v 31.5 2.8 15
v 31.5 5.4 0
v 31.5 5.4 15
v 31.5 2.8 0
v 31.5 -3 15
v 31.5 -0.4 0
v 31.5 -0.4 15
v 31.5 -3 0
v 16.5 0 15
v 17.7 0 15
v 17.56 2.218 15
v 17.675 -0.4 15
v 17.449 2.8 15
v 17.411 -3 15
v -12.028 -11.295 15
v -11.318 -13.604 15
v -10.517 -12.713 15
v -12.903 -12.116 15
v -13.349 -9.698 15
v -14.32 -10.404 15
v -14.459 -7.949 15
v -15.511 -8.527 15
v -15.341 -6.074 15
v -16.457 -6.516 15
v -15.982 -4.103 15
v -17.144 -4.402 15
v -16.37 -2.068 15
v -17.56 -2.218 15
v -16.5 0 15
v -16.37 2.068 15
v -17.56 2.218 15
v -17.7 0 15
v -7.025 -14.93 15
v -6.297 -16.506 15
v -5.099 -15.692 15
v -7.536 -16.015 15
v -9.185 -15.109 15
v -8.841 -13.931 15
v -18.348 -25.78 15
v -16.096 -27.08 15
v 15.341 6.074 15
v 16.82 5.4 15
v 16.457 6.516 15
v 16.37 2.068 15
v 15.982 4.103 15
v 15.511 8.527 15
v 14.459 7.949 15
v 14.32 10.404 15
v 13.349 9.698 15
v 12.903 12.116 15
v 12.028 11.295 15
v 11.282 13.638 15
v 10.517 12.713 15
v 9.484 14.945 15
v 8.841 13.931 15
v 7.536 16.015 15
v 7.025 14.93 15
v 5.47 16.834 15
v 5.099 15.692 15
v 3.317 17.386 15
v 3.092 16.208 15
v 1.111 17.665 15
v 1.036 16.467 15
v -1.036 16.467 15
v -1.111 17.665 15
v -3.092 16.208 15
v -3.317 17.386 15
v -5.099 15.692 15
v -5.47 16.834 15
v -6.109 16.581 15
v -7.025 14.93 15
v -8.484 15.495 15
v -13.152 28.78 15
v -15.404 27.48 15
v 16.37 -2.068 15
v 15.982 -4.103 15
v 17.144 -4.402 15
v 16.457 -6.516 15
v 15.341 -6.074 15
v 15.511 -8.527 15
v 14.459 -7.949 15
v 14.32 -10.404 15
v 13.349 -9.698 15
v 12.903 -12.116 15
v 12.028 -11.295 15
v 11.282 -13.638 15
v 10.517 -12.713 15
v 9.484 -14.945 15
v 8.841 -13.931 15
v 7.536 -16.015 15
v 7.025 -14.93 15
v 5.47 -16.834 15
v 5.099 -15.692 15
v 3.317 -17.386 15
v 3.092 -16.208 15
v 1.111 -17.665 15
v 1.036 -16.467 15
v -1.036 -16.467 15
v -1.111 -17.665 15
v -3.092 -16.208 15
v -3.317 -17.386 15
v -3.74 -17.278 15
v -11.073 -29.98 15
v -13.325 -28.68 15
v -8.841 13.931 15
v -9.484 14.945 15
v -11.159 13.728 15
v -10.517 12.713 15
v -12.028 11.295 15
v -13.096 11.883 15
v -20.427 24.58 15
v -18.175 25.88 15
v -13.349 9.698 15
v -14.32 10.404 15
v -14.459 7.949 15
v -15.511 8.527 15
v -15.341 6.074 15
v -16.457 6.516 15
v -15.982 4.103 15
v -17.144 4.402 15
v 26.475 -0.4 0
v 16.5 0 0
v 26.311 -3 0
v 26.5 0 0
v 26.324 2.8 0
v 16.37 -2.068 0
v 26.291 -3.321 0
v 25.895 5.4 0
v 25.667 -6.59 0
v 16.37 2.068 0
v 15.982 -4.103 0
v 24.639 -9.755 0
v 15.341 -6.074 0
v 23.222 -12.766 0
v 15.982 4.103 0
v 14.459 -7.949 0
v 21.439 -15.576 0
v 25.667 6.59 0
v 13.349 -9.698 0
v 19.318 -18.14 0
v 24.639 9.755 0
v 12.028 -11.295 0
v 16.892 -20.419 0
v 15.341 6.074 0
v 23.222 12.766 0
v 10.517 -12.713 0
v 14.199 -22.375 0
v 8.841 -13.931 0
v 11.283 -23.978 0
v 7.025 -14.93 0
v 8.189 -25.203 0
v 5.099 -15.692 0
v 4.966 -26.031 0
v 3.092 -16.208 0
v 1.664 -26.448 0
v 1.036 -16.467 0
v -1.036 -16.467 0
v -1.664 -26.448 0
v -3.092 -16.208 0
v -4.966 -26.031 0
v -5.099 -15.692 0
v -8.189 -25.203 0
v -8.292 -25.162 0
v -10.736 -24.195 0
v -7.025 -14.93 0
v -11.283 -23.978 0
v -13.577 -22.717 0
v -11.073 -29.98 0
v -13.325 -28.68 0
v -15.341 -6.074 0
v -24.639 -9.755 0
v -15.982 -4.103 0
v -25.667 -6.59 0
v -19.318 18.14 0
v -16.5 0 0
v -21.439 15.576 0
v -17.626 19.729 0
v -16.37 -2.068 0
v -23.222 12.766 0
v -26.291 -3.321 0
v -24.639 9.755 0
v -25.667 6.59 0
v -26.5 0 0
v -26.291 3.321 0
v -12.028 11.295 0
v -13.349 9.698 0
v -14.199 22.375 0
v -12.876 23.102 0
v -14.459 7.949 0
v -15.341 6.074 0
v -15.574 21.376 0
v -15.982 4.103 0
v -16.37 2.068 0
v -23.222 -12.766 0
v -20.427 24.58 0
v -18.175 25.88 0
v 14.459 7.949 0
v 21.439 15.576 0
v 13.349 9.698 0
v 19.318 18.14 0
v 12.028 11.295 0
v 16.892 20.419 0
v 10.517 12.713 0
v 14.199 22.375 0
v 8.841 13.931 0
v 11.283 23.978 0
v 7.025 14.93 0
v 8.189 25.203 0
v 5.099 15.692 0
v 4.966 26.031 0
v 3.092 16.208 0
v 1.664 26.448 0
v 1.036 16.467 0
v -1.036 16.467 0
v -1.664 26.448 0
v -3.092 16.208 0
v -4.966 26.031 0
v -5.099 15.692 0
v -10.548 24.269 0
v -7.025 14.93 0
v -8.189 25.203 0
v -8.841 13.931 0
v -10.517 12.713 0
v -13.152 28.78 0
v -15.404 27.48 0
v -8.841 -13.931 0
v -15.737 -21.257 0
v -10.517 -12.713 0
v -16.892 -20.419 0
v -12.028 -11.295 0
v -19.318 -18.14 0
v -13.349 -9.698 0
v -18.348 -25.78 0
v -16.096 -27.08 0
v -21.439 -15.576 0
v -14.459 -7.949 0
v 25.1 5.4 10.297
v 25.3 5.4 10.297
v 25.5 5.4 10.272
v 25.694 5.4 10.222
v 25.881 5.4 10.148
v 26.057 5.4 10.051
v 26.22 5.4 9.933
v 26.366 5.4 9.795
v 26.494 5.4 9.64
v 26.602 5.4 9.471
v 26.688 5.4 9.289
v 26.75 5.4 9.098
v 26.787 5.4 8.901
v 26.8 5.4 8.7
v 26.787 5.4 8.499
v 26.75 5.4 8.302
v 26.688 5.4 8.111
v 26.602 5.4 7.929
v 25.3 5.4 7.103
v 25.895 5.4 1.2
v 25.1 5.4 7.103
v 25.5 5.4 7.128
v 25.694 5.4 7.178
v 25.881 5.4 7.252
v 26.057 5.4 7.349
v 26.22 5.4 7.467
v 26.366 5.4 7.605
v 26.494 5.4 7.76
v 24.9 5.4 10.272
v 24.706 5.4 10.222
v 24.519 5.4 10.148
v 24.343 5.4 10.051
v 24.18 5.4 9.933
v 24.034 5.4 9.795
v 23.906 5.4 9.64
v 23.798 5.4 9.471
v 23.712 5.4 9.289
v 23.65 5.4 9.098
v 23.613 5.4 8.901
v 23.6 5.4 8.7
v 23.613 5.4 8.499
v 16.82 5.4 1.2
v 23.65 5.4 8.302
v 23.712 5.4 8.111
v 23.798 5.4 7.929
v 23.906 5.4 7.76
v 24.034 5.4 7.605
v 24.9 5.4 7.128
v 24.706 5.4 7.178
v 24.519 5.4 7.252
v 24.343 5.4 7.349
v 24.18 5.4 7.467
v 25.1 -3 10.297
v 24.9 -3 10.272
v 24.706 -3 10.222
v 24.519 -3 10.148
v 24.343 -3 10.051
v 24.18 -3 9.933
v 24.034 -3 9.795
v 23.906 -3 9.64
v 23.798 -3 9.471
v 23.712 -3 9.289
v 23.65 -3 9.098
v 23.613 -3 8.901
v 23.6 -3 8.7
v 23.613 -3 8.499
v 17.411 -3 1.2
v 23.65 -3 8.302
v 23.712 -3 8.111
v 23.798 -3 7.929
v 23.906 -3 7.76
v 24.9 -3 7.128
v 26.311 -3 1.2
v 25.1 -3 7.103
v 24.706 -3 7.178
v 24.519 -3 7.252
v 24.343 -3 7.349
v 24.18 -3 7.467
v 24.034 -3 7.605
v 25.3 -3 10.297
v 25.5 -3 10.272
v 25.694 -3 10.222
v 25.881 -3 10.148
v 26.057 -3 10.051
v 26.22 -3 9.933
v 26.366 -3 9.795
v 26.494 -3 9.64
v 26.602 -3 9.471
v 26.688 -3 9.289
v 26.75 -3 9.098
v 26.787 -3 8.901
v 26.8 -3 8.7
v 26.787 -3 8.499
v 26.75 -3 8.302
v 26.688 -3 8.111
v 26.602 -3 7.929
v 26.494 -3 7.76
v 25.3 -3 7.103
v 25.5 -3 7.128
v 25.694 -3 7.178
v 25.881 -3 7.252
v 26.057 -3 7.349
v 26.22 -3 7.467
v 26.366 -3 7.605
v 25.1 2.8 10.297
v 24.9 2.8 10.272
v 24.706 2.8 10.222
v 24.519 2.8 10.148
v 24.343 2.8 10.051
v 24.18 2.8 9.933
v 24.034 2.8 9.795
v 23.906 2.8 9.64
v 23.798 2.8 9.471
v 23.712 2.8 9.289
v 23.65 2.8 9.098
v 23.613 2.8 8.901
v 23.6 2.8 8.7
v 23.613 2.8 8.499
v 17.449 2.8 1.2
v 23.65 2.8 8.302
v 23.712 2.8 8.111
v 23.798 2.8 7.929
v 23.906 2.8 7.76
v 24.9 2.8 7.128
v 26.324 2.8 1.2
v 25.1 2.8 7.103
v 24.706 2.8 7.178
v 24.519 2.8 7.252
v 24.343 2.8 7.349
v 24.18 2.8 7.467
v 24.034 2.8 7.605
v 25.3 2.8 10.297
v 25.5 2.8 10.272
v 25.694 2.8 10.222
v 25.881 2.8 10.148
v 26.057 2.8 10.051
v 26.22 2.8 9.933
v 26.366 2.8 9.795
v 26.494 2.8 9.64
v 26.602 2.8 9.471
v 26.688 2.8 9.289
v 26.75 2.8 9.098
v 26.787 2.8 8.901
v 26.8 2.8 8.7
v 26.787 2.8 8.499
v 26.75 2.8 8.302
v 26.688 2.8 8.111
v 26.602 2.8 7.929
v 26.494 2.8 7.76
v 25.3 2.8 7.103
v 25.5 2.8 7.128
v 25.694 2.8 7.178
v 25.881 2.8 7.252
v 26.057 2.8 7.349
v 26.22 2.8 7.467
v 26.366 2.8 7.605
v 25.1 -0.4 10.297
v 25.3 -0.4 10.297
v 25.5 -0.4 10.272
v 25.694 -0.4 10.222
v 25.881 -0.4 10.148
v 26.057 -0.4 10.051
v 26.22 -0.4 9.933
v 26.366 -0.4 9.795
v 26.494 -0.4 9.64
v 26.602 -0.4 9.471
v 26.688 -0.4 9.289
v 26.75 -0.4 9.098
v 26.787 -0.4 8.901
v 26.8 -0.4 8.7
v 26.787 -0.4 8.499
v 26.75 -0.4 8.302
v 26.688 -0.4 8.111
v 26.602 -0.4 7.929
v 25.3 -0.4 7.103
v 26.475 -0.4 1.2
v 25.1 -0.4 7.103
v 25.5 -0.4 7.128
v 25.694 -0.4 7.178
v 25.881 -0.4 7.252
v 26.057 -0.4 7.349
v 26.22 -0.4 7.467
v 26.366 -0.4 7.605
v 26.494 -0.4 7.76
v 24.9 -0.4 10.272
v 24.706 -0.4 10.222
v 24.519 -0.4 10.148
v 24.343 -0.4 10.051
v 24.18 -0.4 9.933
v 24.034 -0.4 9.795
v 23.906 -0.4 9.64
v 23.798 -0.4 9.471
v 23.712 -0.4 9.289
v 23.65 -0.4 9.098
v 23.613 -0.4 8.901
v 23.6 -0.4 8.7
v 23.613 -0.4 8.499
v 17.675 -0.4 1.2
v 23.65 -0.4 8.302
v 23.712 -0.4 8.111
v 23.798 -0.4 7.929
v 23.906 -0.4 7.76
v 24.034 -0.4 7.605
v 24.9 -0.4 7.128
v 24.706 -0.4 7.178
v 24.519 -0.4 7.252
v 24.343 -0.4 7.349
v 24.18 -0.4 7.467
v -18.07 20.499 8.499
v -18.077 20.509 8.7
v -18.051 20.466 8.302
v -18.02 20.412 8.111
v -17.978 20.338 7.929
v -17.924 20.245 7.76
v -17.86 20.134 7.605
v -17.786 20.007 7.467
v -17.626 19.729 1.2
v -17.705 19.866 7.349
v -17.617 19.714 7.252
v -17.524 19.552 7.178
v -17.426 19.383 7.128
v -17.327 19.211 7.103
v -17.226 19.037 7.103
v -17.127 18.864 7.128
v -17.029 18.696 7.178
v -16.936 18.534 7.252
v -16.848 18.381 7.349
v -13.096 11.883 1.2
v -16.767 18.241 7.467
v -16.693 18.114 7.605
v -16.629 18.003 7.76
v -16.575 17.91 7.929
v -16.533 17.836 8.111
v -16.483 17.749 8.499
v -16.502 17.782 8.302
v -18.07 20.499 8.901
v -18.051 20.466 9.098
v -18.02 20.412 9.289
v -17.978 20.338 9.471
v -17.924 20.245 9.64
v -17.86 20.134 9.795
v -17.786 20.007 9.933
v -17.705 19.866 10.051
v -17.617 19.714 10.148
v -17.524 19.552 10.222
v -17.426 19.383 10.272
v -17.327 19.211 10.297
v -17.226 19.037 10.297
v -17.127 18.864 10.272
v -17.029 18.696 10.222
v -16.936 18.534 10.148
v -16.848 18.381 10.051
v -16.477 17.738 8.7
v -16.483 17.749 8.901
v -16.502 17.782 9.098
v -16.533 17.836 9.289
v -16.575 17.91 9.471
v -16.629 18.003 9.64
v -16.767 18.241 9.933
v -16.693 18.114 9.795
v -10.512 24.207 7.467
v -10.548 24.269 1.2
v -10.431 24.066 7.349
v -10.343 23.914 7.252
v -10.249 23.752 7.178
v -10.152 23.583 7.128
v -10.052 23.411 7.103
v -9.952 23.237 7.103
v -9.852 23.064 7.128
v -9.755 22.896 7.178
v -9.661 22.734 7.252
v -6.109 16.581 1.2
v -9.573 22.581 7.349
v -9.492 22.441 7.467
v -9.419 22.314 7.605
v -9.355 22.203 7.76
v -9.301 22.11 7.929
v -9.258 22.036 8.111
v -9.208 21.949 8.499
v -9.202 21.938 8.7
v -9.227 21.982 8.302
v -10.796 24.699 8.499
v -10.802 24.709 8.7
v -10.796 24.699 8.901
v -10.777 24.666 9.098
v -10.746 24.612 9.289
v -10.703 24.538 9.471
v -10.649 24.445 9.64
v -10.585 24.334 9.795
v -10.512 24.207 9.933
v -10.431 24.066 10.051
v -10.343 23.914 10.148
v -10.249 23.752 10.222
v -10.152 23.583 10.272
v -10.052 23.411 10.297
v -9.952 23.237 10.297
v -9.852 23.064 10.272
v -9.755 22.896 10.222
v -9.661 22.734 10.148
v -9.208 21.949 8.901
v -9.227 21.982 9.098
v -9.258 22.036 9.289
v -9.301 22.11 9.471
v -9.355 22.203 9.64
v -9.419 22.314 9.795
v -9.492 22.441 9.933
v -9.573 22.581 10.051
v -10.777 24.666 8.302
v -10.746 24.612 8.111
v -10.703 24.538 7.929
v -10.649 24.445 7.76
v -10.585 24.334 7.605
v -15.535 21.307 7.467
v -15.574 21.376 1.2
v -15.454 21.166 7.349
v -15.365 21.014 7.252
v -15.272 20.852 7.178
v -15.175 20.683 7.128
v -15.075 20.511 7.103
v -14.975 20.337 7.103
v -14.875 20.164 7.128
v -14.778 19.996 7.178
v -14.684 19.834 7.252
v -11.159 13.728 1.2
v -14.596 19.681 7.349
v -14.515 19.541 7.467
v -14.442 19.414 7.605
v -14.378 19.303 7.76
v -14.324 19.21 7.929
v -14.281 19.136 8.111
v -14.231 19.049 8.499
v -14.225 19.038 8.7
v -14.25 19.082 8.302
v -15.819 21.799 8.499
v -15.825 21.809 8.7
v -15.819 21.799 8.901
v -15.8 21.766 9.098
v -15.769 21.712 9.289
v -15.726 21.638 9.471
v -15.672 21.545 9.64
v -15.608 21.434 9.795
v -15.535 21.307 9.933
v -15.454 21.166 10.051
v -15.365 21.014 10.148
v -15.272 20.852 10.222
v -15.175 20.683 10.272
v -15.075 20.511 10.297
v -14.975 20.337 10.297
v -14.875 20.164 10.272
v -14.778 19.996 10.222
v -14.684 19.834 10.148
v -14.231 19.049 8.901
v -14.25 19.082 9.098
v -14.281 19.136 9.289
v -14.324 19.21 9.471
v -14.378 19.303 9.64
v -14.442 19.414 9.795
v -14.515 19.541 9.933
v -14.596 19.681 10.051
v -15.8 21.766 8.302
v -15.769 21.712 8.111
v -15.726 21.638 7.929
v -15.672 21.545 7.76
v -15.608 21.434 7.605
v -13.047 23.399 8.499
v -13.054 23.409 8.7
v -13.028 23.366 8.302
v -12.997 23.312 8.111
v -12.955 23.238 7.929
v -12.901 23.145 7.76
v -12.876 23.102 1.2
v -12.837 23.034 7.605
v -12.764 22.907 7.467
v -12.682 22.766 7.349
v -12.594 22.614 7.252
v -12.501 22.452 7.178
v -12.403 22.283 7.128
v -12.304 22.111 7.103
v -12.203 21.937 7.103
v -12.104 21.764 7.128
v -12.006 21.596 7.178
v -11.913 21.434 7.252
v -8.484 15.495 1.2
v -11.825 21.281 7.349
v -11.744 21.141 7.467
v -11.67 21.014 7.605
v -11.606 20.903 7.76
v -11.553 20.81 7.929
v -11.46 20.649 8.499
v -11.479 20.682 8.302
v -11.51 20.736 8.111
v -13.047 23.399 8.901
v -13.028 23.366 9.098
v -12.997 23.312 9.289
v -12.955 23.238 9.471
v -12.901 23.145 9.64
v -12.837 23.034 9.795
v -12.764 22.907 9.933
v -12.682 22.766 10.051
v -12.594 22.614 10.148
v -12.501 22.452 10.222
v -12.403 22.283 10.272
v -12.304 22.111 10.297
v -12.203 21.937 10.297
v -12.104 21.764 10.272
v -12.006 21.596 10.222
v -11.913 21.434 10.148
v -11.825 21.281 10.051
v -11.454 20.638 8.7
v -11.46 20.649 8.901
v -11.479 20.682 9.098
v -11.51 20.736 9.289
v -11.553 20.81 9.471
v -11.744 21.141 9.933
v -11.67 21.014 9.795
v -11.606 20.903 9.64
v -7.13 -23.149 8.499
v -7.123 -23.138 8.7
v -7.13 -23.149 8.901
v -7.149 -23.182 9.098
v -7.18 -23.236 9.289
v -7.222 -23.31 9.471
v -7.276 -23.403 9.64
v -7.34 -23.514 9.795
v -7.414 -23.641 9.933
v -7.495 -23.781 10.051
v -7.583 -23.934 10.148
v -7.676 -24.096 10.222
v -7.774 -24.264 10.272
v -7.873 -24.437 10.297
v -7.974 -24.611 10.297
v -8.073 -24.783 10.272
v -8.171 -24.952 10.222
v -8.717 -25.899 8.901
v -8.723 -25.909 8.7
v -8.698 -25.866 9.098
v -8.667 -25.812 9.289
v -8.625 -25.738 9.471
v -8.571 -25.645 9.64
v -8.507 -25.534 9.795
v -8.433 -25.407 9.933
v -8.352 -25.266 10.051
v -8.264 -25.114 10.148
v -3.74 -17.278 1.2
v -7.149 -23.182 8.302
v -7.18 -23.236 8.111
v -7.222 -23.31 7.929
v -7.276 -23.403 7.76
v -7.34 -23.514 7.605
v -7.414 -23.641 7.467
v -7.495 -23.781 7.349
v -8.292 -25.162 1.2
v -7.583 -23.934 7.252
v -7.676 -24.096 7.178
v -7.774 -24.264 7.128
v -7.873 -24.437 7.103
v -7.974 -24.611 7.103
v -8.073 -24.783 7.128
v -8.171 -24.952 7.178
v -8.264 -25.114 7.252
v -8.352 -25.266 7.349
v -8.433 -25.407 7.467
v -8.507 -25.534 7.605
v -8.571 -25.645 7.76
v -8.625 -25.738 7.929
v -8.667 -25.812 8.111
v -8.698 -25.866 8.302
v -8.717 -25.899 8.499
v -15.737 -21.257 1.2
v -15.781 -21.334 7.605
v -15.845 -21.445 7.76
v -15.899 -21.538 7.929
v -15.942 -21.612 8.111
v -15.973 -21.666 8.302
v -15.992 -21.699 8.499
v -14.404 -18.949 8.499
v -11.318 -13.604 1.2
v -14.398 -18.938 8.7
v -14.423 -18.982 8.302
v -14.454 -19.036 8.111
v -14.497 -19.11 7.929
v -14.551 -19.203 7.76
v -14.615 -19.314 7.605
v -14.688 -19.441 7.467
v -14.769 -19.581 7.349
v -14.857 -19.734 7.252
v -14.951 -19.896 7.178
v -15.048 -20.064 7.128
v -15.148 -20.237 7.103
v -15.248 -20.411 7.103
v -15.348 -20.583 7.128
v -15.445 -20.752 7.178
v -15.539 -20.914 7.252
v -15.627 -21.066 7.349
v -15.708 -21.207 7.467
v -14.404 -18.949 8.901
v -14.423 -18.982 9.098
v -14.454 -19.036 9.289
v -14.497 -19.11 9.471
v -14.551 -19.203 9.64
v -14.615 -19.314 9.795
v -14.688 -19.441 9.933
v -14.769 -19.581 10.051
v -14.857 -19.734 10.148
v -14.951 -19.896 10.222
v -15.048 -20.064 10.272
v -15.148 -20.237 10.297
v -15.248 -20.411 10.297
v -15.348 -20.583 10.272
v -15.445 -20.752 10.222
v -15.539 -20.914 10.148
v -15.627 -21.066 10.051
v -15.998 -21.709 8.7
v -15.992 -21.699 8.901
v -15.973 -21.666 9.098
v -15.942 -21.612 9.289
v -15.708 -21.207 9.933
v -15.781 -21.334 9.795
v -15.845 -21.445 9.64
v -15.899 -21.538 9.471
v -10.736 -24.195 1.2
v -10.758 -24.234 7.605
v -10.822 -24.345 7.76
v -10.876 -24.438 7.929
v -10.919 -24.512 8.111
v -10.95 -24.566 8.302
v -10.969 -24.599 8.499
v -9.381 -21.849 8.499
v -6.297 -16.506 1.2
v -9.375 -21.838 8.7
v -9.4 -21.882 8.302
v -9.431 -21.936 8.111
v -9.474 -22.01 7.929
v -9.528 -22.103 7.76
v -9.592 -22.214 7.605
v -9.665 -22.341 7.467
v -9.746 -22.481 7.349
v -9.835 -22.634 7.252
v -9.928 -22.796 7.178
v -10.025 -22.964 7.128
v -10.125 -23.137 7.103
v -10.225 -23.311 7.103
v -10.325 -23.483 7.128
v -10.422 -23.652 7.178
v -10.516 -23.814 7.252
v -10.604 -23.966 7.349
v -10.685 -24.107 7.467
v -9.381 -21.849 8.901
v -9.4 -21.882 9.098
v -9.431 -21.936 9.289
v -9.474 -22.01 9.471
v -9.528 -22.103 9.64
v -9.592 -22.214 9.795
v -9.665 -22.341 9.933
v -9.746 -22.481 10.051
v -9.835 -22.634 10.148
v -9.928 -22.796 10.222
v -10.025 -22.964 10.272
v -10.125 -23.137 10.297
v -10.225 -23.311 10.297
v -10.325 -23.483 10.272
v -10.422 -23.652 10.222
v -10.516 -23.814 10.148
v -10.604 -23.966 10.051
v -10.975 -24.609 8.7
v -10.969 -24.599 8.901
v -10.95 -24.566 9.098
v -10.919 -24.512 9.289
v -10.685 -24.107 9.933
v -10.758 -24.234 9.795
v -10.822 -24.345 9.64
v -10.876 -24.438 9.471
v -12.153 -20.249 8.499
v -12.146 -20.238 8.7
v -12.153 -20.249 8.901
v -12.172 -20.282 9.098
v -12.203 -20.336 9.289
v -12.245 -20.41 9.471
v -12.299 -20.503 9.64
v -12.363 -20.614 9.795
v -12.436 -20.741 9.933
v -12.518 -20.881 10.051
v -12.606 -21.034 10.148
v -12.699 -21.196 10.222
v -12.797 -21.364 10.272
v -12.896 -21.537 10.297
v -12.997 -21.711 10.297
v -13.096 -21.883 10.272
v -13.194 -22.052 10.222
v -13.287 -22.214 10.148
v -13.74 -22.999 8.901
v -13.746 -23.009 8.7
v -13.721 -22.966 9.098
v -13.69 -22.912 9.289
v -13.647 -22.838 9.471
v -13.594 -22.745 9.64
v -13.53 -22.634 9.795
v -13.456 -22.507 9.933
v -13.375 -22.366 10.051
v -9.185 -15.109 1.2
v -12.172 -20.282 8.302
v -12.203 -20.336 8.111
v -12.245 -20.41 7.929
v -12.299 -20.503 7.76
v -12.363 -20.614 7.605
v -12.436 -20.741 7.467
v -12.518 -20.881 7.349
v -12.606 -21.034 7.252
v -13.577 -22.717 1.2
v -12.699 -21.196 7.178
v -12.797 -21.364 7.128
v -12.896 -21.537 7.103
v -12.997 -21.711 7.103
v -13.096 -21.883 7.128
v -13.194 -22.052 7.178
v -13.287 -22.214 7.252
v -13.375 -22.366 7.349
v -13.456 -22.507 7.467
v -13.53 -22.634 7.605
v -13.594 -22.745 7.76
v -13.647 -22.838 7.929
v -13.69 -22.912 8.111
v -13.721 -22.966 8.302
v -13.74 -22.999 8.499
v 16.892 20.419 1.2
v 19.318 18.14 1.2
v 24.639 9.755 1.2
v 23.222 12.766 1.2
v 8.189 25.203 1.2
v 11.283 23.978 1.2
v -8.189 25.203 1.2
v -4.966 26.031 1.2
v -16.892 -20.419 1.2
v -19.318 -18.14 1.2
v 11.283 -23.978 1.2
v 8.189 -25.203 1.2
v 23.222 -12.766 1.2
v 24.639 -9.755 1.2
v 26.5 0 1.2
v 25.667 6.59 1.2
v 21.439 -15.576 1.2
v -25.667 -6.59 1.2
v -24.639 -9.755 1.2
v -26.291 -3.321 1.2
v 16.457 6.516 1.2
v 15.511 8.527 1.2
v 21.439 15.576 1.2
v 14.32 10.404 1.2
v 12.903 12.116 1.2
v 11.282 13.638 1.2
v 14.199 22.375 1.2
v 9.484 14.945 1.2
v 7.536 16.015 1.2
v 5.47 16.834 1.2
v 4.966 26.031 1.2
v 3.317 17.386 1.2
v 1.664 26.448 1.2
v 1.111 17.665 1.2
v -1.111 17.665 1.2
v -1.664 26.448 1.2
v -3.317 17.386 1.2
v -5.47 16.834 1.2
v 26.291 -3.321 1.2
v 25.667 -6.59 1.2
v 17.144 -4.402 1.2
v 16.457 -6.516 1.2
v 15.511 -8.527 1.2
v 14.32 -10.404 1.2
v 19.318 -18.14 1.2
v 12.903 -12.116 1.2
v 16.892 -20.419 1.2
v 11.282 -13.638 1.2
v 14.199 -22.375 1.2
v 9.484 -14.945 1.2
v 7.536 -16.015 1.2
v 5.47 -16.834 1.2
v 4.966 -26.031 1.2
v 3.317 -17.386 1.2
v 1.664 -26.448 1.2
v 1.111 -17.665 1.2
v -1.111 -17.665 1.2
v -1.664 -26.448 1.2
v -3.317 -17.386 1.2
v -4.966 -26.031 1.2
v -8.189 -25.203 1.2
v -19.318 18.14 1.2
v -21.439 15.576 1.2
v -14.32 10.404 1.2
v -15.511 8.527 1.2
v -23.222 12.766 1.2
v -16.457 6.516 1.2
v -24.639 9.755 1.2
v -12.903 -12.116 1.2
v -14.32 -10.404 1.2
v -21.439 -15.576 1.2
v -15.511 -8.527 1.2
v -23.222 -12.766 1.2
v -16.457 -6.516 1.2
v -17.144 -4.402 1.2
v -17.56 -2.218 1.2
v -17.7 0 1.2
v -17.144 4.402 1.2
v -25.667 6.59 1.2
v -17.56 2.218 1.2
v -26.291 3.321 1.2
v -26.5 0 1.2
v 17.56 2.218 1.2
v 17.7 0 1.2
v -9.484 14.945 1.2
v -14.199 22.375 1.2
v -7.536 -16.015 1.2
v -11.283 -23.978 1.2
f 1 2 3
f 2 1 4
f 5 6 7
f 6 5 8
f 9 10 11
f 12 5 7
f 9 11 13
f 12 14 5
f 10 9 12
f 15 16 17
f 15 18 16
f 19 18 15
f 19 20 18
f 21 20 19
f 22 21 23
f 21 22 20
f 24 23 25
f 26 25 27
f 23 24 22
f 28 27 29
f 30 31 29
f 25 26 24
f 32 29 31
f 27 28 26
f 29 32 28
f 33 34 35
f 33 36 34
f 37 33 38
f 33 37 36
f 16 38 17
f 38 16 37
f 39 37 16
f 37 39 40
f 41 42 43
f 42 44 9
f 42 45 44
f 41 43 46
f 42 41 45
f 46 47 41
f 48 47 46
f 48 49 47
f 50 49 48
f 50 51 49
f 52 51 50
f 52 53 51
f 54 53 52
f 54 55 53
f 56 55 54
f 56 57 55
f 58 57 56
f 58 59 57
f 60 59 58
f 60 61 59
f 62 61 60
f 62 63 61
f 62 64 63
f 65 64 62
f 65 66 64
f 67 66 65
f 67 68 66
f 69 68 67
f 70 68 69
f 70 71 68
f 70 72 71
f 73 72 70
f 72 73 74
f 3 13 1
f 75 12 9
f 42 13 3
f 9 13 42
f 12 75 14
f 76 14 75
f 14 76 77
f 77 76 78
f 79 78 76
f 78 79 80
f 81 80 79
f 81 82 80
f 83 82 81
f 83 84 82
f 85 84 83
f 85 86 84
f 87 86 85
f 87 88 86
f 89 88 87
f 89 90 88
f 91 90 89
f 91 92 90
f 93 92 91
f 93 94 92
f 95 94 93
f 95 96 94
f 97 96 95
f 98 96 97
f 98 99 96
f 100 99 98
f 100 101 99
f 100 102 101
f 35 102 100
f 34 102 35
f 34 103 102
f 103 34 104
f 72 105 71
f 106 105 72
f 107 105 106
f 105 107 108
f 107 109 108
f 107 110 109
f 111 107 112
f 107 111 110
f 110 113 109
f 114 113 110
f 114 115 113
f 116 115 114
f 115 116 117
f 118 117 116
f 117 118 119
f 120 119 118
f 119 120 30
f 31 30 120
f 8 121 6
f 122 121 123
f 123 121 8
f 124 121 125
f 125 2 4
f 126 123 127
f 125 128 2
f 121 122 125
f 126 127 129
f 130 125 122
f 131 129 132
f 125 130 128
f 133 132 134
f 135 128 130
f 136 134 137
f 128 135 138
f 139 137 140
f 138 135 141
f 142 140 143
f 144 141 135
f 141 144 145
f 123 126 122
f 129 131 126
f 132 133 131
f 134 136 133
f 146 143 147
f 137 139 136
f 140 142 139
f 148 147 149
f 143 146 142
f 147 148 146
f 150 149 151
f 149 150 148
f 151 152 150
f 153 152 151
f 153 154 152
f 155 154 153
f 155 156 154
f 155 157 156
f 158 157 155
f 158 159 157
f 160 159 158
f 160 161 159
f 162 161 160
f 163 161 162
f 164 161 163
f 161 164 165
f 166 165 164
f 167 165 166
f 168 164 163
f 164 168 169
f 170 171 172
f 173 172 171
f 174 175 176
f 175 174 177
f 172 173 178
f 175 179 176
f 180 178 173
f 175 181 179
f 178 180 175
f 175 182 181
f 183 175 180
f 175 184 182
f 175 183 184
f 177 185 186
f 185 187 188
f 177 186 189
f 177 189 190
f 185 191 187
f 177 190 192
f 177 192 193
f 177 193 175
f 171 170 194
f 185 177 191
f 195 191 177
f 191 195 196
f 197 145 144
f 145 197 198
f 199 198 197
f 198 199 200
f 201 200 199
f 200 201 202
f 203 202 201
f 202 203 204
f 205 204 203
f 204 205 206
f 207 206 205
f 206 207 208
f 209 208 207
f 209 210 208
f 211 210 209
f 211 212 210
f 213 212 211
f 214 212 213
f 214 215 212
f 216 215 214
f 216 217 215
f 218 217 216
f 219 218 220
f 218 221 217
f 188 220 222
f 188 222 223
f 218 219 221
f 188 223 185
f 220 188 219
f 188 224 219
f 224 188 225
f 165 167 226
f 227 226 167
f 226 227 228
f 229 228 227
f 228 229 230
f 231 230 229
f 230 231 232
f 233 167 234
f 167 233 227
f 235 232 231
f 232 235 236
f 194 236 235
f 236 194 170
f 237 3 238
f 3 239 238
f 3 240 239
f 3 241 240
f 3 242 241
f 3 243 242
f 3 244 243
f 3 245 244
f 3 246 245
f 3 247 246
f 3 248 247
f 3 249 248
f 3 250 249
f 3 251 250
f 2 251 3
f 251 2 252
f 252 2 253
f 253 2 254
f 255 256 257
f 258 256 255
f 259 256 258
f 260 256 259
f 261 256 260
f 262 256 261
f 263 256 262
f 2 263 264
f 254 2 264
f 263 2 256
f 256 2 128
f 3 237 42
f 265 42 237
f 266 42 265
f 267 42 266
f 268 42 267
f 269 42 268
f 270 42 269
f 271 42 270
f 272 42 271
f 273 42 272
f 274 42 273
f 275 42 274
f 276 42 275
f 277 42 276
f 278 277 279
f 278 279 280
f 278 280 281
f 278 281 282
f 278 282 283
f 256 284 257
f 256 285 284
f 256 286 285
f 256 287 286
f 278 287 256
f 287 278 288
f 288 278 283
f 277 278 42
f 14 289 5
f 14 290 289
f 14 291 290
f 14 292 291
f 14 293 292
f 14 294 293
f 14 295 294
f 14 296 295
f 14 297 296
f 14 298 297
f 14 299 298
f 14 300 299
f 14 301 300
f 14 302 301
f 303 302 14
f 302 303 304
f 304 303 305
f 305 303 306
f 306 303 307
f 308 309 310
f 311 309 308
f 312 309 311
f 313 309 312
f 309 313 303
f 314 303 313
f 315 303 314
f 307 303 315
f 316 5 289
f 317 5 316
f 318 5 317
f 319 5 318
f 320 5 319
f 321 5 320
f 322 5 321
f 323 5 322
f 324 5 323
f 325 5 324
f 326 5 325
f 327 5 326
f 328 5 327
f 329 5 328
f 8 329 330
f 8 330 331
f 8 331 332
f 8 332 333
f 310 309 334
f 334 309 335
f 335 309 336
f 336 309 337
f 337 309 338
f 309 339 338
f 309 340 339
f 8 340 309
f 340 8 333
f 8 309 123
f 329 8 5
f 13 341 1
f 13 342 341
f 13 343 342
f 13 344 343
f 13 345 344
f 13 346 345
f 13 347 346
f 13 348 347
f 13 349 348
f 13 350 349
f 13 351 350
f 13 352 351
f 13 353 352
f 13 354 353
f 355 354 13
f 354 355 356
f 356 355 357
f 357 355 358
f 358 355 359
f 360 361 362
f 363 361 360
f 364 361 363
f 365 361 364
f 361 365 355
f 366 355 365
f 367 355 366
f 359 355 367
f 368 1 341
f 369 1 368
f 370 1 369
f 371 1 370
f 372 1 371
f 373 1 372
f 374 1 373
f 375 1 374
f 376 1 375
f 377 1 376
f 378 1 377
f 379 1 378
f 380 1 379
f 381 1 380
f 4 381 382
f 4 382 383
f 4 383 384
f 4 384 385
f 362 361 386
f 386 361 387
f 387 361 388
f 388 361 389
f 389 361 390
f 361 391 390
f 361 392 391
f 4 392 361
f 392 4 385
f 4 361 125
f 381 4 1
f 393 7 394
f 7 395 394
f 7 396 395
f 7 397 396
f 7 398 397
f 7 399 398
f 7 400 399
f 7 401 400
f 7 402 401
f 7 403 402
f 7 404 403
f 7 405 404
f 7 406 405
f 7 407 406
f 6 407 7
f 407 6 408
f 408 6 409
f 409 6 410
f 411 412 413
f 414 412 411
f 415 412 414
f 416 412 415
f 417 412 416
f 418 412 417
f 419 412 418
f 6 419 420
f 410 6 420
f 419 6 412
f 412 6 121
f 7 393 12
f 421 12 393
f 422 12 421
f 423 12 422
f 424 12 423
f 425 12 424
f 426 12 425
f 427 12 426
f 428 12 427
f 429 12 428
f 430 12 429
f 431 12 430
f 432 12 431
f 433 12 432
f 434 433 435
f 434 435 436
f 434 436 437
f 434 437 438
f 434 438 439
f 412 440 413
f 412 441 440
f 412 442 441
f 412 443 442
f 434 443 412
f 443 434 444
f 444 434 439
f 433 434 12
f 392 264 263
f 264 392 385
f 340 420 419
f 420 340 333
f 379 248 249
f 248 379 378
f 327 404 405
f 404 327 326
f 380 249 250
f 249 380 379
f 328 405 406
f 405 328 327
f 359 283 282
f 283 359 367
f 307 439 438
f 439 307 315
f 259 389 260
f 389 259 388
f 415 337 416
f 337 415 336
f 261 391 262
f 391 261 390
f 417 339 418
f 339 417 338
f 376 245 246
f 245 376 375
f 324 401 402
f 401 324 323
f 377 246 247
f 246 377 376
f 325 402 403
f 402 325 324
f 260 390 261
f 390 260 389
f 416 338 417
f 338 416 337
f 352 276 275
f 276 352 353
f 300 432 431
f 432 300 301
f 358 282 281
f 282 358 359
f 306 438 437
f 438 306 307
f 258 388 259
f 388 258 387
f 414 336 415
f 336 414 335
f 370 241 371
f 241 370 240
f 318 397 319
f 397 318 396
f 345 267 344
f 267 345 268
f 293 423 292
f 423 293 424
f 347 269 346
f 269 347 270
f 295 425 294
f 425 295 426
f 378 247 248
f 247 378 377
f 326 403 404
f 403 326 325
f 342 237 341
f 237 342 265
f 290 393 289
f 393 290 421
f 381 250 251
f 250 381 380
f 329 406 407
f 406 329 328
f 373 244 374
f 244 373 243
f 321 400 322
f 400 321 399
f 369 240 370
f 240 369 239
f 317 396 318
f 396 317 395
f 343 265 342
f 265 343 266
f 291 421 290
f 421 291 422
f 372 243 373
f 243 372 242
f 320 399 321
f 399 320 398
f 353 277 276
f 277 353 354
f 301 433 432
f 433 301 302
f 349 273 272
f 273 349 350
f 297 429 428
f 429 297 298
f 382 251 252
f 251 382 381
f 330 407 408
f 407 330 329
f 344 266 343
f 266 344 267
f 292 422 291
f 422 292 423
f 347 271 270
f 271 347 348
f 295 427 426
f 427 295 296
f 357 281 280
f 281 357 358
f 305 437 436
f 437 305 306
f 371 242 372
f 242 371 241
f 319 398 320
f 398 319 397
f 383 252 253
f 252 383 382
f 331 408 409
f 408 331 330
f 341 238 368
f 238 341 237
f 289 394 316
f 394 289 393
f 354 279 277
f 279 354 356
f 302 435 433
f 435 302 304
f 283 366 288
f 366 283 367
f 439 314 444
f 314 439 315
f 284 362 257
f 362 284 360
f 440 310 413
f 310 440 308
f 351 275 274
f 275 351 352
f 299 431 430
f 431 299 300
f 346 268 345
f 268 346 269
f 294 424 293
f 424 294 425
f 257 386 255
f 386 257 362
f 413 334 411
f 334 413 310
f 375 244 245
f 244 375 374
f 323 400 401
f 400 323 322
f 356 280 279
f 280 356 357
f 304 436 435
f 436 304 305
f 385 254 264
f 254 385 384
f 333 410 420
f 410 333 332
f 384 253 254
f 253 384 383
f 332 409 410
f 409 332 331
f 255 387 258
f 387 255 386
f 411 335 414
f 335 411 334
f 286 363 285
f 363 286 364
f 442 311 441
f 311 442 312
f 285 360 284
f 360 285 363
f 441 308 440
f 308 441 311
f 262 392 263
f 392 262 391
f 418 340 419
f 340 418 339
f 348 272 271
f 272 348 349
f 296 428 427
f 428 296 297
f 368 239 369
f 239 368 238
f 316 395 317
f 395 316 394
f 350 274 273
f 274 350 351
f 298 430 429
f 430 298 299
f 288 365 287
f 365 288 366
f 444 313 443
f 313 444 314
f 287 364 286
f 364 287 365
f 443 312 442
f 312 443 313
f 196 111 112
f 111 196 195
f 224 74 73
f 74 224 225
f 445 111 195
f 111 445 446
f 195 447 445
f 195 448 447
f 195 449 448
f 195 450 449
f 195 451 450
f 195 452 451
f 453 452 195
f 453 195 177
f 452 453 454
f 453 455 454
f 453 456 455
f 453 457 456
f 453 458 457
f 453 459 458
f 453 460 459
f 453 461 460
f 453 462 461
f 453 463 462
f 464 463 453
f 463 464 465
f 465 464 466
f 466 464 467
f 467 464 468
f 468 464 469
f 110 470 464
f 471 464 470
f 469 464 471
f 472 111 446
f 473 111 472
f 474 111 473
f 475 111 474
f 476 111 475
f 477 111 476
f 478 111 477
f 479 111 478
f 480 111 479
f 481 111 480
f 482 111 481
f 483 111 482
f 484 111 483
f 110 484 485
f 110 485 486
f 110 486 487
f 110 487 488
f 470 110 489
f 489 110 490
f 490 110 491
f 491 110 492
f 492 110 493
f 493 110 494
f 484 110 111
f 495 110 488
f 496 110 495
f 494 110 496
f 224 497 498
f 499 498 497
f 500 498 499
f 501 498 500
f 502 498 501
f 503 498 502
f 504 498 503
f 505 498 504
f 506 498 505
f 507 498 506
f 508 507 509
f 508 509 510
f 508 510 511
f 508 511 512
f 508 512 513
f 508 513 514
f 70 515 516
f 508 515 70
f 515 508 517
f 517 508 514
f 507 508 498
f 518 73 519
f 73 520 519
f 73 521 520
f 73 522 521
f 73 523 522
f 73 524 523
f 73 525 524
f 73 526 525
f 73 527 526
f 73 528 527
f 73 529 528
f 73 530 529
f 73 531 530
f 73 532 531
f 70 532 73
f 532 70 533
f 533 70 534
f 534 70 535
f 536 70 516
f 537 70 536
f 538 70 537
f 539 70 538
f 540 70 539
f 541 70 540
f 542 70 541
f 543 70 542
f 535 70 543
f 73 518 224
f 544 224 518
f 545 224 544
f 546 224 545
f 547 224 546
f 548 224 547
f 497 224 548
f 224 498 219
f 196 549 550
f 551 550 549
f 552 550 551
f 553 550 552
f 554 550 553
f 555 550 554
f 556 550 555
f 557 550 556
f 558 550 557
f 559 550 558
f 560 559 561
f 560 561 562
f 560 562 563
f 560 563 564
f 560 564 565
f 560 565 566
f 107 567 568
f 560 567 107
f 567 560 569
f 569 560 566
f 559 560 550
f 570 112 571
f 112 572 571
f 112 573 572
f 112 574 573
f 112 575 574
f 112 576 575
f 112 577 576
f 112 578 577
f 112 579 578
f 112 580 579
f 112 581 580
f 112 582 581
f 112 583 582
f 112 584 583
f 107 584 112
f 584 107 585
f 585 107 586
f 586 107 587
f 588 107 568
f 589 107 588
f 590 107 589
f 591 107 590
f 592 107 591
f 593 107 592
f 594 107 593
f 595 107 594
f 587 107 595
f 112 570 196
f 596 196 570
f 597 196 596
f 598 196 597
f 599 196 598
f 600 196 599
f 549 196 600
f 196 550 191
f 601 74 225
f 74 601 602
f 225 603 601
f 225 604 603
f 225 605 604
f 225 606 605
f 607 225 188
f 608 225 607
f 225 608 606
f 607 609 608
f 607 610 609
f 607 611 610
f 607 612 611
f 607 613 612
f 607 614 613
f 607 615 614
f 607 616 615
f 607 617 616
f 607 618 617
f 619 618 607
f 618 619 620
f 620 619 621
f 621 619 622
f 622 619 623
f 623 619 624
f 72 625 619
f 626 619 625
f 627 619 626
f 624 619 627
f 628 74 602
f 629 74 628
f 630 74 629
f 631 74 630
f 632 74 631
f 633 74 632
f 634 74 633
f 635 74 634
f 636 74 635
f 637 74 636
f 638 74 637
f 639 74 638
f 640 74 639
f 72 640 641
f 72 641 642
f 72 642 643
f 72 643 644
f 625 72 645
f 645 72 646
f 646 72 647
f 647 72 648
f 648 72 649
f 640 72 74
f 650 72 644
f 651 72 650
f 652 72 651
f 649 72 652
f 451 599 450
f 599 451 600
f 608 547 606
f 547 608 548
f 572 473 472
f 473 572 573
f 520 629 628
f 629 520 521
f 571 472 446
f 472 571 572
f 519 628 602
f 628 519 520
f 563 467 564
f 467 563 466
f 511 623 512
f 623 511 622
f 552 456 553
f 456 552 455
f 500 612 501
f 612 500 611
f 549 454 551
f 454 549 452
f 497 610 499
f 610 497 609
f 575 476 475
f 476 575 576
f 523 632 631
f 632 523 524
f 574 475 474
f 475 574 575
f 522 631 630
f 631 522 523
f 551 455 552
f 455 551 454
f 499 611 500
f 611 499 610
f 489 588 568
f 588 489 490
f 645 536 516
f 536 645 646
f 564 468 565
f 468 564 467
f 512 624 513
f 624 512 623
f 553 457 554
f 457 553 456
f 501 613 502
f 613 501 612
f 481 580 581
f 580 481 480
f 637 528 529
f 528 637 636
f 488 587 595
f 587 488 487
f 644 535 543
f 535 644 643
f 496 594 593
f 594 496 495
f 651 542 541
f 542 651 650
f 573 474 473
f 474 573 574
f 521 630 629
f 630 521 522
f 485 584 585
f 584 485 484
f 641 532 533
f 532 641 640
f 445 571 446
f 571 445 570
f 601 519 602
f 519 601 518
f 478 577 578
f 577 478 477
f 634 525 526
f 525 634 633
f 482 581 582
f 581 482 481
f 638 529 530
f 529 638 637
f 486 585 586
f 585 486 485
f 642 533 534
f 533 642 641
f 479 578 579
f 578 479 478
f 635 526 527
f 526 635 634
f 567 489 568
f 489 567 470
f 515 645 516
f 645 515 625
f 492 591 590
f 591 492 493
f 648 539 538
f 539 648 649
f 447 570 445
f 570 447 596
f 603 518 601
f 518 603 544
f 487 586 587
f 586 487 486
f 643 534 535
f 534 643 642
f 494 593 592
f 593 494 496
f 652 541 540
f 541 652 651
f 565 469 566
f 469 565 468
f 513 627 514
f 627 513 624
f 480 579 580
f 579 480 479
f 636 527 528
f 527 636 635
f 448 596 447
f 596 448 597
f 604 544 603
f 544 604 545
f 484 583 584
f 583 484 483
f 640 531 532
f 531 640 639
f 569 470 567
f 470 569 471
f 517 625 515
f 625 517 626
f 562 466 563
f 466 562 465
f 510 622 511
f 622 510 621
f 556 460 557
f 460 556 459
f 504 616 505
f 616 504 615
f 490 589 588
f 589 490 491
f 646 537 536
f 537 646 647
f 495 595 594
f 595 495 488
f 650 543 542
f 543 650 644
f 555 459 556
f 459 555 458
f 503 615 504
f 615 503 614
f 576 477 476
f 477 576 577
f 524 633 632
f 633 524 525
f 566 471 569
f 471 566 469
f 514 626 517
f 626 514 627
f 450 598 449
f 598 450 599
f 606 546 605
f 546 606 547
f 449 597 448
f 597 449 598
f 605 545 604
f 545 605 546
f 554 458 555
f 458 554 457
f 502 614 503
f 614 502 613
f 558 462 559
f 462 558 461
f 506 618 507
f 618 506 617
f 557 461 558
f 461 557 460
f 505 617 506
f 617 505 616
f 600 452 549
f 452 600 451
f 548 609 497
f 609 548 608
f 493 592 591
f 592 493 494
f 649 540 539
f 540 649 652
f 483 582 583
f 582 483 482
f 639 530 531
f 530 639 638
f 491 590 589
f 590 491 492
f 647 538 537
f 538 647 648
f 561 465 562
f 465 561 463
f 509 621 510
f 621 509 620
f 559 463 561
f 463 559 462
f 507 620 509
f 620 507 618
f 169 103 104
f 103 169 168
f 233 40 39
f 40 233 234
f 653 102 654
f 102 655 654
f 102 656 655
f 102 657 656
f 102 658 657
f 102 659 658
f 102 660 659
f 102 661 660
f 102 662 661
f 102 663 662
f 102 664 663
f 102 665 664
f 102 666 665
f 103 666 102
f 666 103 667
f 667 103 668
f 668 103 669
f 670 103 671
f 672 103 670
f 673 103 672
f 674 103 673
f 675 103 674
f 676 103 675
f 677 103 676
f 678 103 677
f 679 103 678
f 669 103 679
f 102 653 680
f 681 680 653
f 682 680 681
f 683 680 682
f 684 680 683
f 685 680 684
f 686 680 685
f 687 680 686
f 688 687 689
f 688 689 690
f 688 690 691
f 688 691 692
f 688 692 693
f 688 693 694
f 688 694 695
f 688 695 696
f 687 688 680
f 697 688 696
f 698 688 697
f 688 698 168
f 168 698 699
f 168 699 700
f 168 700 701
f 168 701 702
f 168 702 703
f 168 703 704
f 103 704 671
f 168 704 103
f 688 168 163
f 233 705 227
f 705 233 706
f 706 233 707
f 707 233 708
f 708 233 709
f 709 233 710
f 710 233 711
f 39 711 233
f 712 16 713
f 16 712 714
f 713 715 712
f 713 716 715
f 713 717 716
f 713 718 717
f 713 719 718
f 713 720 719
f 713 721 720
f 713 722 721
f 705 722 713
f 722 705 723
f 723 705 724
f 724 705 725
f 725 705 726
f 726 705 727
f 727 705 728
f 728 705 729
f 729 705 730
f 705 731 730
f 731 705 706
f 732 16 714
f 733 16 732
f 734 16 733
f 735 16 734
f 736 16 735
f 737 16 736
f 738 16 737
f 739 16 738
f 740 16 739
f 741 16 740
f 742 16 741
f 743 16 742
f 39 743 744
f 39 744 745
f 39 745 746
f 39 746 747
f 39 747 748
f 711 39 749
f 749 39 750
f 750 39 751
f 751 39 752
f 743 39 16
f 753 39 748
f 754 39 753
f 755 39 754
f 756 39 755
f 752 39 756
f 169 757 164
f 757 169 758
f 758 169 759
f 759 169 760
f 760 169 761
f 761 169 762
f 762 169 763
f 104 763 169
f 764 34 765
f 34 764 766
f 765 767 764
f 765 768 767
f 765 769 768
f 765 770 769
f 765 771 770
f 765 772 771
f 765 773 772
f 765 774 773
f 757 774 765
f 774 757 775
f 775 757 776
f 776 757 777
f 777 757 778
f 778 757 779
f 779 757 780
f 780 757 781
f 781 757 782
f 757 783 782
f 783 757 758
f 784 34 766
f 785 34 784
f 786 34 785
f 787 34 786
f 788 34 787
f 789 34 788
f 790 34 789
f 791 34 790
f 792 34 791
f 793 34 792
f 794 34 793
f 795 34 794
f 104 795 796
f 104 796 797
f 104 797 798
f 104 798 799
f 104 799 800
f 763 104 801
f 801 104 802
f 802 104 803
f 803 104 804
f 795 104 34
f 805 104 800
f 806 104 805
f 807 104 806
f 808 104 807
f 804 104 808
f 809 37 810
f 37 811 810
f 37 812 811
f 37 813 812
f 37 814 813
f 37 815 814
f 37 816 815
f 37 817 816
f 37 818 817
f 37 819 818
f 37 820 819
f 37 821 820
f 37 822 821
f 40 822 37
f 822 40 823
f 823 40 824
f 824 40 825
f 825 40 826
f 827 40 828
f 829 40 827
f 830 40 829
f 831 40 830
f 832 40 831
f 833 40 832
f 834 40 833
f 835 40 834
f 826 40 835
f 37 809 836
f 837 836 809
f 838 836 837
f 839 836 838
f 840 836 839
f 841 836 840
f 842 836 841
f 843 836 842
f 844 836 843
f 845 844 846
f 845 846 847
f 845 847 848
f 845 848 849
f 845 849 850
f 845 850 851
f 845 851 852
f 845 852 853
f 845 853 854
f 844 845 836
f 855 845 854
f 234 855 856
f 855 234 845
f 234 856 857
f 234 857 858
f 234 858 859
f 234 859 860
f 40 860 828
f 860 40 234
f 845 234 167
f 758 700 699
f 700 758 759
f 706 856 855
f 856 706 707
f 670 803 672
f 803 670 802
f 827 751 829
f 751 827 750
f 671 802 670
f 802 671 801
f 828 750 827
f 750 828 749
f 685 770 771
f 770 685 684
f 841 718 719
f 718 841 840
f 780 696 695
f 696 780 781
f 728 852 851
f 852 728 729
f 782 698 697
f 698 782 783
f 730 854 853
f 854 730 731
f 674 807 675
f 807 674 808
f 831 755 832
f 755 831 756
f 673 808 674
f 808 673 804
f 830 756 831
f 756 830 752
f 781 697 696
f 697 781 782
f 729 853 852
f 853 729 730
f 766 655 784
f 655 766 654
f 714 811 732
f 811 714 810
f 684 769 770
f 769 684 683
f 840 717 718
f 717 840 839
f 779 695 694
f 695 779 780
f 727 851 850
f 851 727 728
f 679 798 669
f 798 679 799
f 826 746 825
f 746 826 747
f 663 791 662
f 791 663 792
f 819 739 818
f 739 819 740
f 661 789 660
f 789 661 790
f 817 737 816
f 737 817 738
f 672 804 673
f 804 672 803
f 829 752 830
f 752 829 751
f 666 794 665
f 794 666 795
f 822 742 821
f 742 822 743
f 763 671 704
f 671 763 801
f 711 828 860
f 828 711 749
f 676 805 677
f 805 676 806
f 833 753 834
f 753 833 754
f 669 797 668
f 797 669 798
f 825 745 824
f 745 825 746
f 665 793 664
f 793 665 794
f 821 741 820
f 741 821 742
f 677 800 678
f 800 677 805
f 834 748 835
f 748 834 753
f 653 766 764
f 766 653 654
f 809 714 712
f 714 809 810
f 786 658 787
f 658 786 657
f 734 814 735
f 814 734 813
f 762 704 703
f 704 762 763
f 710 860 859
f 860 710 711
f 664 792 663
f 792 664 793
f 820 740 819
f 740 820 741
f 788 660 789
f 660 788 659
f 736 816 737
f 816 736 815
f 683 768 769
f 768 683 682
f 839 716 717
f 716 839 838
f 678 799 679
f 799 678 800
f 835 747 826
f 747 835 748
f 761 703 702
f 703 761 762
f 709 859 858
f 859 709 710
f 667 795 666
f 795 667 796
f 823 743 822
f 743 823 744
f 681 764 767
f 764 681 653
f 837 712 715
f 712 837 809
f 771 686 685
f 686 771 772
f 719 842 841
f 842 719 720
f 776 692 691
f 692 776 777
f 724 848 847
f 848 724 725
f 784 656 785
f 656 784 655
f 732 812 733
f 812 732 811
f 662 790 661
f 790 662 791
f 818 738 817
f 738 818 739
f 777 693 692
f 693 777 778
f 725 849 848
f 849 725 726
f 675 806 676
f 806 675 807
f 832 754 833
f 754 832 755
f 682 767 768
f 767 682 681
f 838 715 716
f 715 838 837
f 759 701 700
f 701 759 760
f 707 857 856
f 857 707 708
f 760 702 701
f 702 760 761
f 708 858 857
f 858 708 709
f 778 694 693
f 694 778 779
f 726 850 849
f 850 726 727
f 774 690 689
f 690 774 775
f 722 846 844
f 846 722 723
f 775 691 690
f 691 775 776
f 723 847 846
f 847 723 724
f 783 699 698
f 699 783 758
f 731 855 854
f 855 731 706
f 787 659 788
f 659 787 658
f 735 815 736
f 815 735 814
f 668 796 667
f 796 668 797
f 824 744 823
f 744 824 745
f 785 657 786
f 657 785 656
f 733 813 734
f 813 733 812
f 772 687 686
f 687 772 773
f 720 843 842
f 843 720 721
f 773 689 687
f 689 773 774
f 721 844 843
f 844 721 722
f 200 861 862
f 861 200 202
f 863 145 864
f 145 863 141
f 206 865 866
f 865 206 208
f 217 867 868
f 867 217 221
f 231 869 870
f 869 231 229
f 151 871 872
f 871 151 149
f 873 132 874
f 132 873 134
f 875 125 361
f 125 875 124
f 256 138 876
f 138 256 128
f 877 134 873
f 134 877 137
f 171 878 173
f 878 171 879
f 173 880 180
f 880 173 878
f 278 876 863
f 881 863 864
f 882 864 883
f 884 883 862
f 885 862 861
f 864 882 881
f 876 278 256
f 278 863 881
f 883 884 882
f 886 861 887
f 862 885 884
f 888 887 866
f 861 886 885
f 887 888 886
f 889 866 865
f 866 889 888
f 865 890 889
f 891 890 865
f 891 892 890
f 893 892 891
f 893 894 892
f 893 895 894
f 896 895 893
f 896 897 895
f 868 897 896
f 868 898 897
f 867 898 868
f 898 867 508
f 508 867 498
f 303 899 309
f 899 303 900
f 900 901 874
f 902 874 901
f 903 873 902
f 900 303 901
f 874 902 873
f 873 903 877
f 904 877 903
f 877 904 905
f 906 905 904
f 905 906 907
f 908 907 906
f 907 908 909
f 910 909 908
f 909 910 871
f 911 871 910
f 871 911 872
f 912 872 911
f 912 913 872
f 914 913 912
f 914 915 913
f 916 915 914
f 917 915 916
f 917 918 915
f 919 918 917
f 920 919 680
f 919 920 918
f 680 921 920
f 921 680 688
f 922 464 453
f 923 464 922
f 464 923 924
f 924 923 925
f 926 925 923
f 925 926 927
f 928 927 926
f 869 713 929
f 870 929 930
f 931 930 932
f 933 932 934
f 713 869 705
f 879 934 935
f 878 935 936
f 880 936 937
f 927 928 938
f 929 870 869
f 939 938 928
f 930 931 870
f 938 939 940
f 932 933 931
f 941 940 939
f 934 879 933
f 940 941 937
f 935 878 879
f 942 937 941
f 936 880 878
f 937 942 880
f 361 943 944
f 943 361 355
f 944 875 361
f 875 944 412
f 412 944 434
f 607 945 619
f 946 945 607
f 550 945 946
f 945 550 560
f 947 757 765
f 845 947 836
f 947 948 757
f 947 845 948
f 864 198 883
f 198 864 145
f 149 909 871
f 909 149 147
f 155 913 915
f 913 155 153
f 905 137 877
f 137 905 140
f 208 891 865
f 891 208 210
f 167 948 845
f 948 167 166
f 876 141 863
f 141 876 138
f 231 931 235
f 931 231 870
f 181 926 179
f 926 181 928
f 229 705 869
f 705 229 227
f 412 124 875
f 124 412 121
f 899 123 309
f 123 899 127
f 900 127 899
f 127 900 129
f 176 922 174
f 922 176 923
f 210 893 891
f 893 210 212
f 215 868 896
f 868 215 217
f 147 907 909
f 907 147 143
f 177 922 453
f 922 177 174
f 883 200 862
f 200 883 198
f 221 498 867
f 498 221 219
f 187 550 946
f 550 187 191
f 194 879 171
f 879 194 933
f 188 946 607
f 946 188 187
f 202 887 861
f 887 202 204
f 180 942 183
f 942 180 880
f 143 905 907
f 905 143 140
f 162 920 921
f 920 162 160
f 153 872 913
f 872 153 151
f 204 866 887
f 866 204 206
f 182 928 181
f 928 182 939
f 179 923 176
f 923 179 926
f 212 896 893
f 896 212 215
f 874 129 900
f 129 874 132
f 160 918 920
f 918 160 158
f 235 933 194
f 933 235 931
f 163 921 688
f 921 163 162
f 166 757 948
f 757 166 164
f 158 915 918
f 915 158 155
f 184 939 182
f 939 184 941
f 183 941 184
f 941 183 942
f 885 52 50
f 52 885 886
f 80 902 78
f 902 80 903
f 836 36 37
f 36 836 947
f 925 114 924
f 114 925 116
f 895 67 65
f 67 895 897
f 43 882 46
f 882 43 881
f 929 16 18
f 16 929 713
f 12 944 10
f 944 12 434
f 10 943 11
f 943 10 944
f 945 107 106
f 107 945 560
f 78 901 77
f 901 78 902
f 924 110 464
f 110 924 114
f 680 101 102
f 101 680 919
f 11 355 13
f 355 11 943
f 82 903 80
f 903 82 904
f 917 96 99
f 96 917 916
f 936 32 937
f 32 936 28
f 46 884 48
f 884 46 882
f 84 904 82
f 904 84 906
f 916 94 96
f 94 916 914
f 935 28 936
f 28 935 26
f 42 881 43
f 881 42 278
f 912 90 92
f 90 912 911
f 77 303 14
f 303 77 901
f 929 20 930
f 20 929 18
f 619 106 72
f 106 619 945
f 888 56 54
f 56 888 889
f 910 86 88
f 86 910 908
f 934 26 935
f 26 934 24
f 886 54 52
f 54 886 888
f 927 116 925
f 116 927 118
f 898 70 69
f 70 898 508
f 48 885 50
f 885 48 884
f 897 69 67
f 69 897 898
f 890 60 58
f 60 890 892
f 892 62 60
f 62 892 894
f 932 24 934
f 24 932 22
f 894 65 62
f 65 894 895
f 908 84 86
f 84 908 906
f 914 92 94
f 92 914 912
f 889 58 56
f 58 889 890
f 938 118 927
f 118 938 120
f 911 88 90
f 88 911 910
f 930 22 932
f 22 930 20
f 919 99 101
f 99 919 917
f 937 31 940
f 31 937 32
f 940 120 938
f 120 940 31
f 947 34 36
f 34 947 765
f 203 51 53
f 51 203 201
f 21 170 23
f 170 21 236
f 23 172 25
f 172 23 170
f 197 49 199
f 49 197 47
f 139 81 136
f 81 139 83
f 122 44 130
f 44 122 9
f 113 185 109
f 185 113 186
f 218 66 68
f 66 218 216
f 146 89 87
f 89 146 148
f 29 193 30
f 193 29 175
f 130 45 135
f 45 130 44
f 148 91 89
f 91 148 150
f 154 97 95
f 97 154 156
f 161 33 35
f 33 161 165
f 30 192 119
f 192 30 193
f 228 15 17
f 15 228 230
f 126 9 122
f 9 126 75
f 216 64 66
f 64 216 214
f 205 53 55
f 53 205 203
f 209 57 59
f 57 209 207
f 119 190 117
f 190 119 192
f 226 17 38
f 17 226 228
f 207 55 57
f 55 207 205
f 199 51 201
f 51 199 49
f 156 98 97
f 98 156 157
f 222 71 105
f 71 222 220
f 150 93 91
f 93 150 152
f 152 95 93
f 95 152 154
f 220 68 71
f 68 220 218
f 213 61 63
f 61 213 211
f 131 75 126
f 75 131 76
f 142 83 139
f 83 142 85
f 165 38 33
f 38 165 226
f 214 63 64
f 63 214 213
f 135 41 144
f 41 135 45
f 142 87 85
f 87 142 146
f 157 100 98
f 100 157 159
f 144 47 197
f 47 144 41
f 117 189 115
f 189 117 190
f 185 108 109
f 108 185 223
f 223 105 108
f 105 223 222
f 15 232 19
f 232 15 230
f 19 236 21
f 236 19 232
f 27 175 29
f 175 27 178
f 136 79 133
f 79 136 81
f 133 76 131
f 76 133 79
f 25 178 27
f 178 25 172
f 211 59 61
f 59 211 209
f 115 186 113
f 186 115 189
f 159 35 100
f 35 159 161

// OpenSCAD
/*----------------------------------------------------------------------------
 * Customisable three-armed spool holder for samples.
 * Created by FeNi64
 * Version 2.0, 2018-03-28
 * Inspired by https://www.thingiverse.com/thing:2033513
 *
 * This program is free software; you can redistribute it and/or modify
 * it under the terms of the GNU General Public License as published by
 * the Free Software Foundation; either version 3 of the License,
 * LGPL version 2.1, or (at your option) any later version of the GPL.
 *
 * This program is distributed in the hope that it will be useful,
 * but WITHOUT ANY WARRANTY; without even the implied warranty of
 * MERCHANTABILITY or FITNESS FOR A PARTICULAR PURPOSE. See the
 * GNU General Public License for more details.
 *
 * You should have received a copy of the GNU General Public License
 * along with this program; if not, write to the Free Software
 * Foundation, Inc., 59 Temple Place, Suite 330, Boston, MA 02111-1307 USA
 *
 *		2018. License, GPL v2 or later
 *----------------------------------------------------------------------------*/

// Display which part(s)?
show=1; //  [1:Hub,2:Arm,3:All]

// Hub hole diameter
hole_d=33; // [5:90]

// Width of hub disc
hub_w=20;  // [10:99]

//  Height of hub wall
hubwall=15; // [10:99]

// Length and diameter of arms.
arc_d=30; // [10:99]

// Diameter of the spool of filament (arms start here)
outer=140; // [50:200]

// Thickness of most things
wall=1.2; // [1:0.1:5]

// Number of arms
armcount=3; // [3:9]

// Filament diameter
filament_d=1.75; // [1.75:2,3.00:3.25]



/* [Hidden] */
M3=3.2;
$fn=50;
armangle=360/armcount;
arm_l=(outer-hole_d-2*hubwall)/2;

if (show==1) {
	Hub();
} else if(show==2) {
	translate([0,5,0])arm();
} else if (show==3) {
	//color("blue")
	Hub();
	for(a=[0:armangle:360]) {
		rotate([0,0,a]) 
			translate([hole_d/2+wall+(hubwall-wall)/2,wall/2,(hubwall-wall)/2+wall+0.5]) rotate([90,0,0])
			arm() ;
	}
}



module Hub() {
	difference() {
		union() {
			cylinder(h=wall,d=hole_d+hub_w);
			cylinder(h=hubwall,d=hole_d + 2 * wall);

			for(a=[0:armangle:360]) {
				rotate([0,0,a]) 
					translate([hole_d/2,-5*wall/2,0])
					difference() {
						cube([hubwall,7*wall,hubwall]);
						translate([-1,3*wall-1,-1])cube([hubwall+wall,wall+2,hubwall+2]);
						// Minus the hole for the M3 bolt.
						translate([hubwall/2+wall,5*hubwall,hubwall/2+wall])rotate([90,0,0]) cylinder(h=10*hubwall,d=M3);

					}
			}

		}
		translate([0,0,-25]) cylinder(h=wall+50,d=hole_d);
	}
}

module arm() {
	// The straight bit
	difference() {
		hull() {
			cylinder(h=2*wall,d=hubwall-wall-1);
			translate([arm_l,-(hubwall-wall)/2,0])cube([2*wall,hubwall-wall,2*wall]);
		}
		// Minus the hole for the M3 bolt.
		translate([0,0,-hubwall]) cylinder(h=2*hubwall,d=M3);

		// Some filament-end holes, at an angle so it bites.
		rotate([45,0,0])translate([arm_l*8/10,0,-10])cylinder(h=wall+30,d=filament_d);
	}
	// The curved bit
	x=arm_l+arc_d-2*wall; // Place it such that the inside arc touches the arm's end.
	translate([x,0,-(hubwall-wall)/3])rotate([0,0,0])scale([2.0,1.0,1.0]) arc(2*wall,hubwall-wall,arc_d/2,180);
}

/* module arc()
 * Excerpt from... 
 * 
 * Parametric Encoder Wheel 
 *
 * by Alex Franke (codecreations), March 2012
 * http://www.theFrankes.com
 * 
 * Licenced under Creative Commons Attribution - Non-Commercial - Share Alike 3.0 
 */

module arc( height, depth, radius, degrees ) {
	// This dies a horible death if it's not rendered here 
	// -- sucks up all memory and spins out of control 
	render() {
		difference() {
			// Outer ring
			rotate_extrude($fn = 50)
				translate([radius - height, 0, 0])
				square([height,depth]);

			// Cut half off
			translate([0,-(radius+1),-.5]) 
				cube ([radius+1,(radius+1)*2,depth+1]);

			// Cover the other half as necessary
			rotate([0,0,180-degrees])
				translate([0,-(radius+1),-.5]) 
				cube ([radius+1,(radius+1)*2,depth+1]);

		}
	}
}
